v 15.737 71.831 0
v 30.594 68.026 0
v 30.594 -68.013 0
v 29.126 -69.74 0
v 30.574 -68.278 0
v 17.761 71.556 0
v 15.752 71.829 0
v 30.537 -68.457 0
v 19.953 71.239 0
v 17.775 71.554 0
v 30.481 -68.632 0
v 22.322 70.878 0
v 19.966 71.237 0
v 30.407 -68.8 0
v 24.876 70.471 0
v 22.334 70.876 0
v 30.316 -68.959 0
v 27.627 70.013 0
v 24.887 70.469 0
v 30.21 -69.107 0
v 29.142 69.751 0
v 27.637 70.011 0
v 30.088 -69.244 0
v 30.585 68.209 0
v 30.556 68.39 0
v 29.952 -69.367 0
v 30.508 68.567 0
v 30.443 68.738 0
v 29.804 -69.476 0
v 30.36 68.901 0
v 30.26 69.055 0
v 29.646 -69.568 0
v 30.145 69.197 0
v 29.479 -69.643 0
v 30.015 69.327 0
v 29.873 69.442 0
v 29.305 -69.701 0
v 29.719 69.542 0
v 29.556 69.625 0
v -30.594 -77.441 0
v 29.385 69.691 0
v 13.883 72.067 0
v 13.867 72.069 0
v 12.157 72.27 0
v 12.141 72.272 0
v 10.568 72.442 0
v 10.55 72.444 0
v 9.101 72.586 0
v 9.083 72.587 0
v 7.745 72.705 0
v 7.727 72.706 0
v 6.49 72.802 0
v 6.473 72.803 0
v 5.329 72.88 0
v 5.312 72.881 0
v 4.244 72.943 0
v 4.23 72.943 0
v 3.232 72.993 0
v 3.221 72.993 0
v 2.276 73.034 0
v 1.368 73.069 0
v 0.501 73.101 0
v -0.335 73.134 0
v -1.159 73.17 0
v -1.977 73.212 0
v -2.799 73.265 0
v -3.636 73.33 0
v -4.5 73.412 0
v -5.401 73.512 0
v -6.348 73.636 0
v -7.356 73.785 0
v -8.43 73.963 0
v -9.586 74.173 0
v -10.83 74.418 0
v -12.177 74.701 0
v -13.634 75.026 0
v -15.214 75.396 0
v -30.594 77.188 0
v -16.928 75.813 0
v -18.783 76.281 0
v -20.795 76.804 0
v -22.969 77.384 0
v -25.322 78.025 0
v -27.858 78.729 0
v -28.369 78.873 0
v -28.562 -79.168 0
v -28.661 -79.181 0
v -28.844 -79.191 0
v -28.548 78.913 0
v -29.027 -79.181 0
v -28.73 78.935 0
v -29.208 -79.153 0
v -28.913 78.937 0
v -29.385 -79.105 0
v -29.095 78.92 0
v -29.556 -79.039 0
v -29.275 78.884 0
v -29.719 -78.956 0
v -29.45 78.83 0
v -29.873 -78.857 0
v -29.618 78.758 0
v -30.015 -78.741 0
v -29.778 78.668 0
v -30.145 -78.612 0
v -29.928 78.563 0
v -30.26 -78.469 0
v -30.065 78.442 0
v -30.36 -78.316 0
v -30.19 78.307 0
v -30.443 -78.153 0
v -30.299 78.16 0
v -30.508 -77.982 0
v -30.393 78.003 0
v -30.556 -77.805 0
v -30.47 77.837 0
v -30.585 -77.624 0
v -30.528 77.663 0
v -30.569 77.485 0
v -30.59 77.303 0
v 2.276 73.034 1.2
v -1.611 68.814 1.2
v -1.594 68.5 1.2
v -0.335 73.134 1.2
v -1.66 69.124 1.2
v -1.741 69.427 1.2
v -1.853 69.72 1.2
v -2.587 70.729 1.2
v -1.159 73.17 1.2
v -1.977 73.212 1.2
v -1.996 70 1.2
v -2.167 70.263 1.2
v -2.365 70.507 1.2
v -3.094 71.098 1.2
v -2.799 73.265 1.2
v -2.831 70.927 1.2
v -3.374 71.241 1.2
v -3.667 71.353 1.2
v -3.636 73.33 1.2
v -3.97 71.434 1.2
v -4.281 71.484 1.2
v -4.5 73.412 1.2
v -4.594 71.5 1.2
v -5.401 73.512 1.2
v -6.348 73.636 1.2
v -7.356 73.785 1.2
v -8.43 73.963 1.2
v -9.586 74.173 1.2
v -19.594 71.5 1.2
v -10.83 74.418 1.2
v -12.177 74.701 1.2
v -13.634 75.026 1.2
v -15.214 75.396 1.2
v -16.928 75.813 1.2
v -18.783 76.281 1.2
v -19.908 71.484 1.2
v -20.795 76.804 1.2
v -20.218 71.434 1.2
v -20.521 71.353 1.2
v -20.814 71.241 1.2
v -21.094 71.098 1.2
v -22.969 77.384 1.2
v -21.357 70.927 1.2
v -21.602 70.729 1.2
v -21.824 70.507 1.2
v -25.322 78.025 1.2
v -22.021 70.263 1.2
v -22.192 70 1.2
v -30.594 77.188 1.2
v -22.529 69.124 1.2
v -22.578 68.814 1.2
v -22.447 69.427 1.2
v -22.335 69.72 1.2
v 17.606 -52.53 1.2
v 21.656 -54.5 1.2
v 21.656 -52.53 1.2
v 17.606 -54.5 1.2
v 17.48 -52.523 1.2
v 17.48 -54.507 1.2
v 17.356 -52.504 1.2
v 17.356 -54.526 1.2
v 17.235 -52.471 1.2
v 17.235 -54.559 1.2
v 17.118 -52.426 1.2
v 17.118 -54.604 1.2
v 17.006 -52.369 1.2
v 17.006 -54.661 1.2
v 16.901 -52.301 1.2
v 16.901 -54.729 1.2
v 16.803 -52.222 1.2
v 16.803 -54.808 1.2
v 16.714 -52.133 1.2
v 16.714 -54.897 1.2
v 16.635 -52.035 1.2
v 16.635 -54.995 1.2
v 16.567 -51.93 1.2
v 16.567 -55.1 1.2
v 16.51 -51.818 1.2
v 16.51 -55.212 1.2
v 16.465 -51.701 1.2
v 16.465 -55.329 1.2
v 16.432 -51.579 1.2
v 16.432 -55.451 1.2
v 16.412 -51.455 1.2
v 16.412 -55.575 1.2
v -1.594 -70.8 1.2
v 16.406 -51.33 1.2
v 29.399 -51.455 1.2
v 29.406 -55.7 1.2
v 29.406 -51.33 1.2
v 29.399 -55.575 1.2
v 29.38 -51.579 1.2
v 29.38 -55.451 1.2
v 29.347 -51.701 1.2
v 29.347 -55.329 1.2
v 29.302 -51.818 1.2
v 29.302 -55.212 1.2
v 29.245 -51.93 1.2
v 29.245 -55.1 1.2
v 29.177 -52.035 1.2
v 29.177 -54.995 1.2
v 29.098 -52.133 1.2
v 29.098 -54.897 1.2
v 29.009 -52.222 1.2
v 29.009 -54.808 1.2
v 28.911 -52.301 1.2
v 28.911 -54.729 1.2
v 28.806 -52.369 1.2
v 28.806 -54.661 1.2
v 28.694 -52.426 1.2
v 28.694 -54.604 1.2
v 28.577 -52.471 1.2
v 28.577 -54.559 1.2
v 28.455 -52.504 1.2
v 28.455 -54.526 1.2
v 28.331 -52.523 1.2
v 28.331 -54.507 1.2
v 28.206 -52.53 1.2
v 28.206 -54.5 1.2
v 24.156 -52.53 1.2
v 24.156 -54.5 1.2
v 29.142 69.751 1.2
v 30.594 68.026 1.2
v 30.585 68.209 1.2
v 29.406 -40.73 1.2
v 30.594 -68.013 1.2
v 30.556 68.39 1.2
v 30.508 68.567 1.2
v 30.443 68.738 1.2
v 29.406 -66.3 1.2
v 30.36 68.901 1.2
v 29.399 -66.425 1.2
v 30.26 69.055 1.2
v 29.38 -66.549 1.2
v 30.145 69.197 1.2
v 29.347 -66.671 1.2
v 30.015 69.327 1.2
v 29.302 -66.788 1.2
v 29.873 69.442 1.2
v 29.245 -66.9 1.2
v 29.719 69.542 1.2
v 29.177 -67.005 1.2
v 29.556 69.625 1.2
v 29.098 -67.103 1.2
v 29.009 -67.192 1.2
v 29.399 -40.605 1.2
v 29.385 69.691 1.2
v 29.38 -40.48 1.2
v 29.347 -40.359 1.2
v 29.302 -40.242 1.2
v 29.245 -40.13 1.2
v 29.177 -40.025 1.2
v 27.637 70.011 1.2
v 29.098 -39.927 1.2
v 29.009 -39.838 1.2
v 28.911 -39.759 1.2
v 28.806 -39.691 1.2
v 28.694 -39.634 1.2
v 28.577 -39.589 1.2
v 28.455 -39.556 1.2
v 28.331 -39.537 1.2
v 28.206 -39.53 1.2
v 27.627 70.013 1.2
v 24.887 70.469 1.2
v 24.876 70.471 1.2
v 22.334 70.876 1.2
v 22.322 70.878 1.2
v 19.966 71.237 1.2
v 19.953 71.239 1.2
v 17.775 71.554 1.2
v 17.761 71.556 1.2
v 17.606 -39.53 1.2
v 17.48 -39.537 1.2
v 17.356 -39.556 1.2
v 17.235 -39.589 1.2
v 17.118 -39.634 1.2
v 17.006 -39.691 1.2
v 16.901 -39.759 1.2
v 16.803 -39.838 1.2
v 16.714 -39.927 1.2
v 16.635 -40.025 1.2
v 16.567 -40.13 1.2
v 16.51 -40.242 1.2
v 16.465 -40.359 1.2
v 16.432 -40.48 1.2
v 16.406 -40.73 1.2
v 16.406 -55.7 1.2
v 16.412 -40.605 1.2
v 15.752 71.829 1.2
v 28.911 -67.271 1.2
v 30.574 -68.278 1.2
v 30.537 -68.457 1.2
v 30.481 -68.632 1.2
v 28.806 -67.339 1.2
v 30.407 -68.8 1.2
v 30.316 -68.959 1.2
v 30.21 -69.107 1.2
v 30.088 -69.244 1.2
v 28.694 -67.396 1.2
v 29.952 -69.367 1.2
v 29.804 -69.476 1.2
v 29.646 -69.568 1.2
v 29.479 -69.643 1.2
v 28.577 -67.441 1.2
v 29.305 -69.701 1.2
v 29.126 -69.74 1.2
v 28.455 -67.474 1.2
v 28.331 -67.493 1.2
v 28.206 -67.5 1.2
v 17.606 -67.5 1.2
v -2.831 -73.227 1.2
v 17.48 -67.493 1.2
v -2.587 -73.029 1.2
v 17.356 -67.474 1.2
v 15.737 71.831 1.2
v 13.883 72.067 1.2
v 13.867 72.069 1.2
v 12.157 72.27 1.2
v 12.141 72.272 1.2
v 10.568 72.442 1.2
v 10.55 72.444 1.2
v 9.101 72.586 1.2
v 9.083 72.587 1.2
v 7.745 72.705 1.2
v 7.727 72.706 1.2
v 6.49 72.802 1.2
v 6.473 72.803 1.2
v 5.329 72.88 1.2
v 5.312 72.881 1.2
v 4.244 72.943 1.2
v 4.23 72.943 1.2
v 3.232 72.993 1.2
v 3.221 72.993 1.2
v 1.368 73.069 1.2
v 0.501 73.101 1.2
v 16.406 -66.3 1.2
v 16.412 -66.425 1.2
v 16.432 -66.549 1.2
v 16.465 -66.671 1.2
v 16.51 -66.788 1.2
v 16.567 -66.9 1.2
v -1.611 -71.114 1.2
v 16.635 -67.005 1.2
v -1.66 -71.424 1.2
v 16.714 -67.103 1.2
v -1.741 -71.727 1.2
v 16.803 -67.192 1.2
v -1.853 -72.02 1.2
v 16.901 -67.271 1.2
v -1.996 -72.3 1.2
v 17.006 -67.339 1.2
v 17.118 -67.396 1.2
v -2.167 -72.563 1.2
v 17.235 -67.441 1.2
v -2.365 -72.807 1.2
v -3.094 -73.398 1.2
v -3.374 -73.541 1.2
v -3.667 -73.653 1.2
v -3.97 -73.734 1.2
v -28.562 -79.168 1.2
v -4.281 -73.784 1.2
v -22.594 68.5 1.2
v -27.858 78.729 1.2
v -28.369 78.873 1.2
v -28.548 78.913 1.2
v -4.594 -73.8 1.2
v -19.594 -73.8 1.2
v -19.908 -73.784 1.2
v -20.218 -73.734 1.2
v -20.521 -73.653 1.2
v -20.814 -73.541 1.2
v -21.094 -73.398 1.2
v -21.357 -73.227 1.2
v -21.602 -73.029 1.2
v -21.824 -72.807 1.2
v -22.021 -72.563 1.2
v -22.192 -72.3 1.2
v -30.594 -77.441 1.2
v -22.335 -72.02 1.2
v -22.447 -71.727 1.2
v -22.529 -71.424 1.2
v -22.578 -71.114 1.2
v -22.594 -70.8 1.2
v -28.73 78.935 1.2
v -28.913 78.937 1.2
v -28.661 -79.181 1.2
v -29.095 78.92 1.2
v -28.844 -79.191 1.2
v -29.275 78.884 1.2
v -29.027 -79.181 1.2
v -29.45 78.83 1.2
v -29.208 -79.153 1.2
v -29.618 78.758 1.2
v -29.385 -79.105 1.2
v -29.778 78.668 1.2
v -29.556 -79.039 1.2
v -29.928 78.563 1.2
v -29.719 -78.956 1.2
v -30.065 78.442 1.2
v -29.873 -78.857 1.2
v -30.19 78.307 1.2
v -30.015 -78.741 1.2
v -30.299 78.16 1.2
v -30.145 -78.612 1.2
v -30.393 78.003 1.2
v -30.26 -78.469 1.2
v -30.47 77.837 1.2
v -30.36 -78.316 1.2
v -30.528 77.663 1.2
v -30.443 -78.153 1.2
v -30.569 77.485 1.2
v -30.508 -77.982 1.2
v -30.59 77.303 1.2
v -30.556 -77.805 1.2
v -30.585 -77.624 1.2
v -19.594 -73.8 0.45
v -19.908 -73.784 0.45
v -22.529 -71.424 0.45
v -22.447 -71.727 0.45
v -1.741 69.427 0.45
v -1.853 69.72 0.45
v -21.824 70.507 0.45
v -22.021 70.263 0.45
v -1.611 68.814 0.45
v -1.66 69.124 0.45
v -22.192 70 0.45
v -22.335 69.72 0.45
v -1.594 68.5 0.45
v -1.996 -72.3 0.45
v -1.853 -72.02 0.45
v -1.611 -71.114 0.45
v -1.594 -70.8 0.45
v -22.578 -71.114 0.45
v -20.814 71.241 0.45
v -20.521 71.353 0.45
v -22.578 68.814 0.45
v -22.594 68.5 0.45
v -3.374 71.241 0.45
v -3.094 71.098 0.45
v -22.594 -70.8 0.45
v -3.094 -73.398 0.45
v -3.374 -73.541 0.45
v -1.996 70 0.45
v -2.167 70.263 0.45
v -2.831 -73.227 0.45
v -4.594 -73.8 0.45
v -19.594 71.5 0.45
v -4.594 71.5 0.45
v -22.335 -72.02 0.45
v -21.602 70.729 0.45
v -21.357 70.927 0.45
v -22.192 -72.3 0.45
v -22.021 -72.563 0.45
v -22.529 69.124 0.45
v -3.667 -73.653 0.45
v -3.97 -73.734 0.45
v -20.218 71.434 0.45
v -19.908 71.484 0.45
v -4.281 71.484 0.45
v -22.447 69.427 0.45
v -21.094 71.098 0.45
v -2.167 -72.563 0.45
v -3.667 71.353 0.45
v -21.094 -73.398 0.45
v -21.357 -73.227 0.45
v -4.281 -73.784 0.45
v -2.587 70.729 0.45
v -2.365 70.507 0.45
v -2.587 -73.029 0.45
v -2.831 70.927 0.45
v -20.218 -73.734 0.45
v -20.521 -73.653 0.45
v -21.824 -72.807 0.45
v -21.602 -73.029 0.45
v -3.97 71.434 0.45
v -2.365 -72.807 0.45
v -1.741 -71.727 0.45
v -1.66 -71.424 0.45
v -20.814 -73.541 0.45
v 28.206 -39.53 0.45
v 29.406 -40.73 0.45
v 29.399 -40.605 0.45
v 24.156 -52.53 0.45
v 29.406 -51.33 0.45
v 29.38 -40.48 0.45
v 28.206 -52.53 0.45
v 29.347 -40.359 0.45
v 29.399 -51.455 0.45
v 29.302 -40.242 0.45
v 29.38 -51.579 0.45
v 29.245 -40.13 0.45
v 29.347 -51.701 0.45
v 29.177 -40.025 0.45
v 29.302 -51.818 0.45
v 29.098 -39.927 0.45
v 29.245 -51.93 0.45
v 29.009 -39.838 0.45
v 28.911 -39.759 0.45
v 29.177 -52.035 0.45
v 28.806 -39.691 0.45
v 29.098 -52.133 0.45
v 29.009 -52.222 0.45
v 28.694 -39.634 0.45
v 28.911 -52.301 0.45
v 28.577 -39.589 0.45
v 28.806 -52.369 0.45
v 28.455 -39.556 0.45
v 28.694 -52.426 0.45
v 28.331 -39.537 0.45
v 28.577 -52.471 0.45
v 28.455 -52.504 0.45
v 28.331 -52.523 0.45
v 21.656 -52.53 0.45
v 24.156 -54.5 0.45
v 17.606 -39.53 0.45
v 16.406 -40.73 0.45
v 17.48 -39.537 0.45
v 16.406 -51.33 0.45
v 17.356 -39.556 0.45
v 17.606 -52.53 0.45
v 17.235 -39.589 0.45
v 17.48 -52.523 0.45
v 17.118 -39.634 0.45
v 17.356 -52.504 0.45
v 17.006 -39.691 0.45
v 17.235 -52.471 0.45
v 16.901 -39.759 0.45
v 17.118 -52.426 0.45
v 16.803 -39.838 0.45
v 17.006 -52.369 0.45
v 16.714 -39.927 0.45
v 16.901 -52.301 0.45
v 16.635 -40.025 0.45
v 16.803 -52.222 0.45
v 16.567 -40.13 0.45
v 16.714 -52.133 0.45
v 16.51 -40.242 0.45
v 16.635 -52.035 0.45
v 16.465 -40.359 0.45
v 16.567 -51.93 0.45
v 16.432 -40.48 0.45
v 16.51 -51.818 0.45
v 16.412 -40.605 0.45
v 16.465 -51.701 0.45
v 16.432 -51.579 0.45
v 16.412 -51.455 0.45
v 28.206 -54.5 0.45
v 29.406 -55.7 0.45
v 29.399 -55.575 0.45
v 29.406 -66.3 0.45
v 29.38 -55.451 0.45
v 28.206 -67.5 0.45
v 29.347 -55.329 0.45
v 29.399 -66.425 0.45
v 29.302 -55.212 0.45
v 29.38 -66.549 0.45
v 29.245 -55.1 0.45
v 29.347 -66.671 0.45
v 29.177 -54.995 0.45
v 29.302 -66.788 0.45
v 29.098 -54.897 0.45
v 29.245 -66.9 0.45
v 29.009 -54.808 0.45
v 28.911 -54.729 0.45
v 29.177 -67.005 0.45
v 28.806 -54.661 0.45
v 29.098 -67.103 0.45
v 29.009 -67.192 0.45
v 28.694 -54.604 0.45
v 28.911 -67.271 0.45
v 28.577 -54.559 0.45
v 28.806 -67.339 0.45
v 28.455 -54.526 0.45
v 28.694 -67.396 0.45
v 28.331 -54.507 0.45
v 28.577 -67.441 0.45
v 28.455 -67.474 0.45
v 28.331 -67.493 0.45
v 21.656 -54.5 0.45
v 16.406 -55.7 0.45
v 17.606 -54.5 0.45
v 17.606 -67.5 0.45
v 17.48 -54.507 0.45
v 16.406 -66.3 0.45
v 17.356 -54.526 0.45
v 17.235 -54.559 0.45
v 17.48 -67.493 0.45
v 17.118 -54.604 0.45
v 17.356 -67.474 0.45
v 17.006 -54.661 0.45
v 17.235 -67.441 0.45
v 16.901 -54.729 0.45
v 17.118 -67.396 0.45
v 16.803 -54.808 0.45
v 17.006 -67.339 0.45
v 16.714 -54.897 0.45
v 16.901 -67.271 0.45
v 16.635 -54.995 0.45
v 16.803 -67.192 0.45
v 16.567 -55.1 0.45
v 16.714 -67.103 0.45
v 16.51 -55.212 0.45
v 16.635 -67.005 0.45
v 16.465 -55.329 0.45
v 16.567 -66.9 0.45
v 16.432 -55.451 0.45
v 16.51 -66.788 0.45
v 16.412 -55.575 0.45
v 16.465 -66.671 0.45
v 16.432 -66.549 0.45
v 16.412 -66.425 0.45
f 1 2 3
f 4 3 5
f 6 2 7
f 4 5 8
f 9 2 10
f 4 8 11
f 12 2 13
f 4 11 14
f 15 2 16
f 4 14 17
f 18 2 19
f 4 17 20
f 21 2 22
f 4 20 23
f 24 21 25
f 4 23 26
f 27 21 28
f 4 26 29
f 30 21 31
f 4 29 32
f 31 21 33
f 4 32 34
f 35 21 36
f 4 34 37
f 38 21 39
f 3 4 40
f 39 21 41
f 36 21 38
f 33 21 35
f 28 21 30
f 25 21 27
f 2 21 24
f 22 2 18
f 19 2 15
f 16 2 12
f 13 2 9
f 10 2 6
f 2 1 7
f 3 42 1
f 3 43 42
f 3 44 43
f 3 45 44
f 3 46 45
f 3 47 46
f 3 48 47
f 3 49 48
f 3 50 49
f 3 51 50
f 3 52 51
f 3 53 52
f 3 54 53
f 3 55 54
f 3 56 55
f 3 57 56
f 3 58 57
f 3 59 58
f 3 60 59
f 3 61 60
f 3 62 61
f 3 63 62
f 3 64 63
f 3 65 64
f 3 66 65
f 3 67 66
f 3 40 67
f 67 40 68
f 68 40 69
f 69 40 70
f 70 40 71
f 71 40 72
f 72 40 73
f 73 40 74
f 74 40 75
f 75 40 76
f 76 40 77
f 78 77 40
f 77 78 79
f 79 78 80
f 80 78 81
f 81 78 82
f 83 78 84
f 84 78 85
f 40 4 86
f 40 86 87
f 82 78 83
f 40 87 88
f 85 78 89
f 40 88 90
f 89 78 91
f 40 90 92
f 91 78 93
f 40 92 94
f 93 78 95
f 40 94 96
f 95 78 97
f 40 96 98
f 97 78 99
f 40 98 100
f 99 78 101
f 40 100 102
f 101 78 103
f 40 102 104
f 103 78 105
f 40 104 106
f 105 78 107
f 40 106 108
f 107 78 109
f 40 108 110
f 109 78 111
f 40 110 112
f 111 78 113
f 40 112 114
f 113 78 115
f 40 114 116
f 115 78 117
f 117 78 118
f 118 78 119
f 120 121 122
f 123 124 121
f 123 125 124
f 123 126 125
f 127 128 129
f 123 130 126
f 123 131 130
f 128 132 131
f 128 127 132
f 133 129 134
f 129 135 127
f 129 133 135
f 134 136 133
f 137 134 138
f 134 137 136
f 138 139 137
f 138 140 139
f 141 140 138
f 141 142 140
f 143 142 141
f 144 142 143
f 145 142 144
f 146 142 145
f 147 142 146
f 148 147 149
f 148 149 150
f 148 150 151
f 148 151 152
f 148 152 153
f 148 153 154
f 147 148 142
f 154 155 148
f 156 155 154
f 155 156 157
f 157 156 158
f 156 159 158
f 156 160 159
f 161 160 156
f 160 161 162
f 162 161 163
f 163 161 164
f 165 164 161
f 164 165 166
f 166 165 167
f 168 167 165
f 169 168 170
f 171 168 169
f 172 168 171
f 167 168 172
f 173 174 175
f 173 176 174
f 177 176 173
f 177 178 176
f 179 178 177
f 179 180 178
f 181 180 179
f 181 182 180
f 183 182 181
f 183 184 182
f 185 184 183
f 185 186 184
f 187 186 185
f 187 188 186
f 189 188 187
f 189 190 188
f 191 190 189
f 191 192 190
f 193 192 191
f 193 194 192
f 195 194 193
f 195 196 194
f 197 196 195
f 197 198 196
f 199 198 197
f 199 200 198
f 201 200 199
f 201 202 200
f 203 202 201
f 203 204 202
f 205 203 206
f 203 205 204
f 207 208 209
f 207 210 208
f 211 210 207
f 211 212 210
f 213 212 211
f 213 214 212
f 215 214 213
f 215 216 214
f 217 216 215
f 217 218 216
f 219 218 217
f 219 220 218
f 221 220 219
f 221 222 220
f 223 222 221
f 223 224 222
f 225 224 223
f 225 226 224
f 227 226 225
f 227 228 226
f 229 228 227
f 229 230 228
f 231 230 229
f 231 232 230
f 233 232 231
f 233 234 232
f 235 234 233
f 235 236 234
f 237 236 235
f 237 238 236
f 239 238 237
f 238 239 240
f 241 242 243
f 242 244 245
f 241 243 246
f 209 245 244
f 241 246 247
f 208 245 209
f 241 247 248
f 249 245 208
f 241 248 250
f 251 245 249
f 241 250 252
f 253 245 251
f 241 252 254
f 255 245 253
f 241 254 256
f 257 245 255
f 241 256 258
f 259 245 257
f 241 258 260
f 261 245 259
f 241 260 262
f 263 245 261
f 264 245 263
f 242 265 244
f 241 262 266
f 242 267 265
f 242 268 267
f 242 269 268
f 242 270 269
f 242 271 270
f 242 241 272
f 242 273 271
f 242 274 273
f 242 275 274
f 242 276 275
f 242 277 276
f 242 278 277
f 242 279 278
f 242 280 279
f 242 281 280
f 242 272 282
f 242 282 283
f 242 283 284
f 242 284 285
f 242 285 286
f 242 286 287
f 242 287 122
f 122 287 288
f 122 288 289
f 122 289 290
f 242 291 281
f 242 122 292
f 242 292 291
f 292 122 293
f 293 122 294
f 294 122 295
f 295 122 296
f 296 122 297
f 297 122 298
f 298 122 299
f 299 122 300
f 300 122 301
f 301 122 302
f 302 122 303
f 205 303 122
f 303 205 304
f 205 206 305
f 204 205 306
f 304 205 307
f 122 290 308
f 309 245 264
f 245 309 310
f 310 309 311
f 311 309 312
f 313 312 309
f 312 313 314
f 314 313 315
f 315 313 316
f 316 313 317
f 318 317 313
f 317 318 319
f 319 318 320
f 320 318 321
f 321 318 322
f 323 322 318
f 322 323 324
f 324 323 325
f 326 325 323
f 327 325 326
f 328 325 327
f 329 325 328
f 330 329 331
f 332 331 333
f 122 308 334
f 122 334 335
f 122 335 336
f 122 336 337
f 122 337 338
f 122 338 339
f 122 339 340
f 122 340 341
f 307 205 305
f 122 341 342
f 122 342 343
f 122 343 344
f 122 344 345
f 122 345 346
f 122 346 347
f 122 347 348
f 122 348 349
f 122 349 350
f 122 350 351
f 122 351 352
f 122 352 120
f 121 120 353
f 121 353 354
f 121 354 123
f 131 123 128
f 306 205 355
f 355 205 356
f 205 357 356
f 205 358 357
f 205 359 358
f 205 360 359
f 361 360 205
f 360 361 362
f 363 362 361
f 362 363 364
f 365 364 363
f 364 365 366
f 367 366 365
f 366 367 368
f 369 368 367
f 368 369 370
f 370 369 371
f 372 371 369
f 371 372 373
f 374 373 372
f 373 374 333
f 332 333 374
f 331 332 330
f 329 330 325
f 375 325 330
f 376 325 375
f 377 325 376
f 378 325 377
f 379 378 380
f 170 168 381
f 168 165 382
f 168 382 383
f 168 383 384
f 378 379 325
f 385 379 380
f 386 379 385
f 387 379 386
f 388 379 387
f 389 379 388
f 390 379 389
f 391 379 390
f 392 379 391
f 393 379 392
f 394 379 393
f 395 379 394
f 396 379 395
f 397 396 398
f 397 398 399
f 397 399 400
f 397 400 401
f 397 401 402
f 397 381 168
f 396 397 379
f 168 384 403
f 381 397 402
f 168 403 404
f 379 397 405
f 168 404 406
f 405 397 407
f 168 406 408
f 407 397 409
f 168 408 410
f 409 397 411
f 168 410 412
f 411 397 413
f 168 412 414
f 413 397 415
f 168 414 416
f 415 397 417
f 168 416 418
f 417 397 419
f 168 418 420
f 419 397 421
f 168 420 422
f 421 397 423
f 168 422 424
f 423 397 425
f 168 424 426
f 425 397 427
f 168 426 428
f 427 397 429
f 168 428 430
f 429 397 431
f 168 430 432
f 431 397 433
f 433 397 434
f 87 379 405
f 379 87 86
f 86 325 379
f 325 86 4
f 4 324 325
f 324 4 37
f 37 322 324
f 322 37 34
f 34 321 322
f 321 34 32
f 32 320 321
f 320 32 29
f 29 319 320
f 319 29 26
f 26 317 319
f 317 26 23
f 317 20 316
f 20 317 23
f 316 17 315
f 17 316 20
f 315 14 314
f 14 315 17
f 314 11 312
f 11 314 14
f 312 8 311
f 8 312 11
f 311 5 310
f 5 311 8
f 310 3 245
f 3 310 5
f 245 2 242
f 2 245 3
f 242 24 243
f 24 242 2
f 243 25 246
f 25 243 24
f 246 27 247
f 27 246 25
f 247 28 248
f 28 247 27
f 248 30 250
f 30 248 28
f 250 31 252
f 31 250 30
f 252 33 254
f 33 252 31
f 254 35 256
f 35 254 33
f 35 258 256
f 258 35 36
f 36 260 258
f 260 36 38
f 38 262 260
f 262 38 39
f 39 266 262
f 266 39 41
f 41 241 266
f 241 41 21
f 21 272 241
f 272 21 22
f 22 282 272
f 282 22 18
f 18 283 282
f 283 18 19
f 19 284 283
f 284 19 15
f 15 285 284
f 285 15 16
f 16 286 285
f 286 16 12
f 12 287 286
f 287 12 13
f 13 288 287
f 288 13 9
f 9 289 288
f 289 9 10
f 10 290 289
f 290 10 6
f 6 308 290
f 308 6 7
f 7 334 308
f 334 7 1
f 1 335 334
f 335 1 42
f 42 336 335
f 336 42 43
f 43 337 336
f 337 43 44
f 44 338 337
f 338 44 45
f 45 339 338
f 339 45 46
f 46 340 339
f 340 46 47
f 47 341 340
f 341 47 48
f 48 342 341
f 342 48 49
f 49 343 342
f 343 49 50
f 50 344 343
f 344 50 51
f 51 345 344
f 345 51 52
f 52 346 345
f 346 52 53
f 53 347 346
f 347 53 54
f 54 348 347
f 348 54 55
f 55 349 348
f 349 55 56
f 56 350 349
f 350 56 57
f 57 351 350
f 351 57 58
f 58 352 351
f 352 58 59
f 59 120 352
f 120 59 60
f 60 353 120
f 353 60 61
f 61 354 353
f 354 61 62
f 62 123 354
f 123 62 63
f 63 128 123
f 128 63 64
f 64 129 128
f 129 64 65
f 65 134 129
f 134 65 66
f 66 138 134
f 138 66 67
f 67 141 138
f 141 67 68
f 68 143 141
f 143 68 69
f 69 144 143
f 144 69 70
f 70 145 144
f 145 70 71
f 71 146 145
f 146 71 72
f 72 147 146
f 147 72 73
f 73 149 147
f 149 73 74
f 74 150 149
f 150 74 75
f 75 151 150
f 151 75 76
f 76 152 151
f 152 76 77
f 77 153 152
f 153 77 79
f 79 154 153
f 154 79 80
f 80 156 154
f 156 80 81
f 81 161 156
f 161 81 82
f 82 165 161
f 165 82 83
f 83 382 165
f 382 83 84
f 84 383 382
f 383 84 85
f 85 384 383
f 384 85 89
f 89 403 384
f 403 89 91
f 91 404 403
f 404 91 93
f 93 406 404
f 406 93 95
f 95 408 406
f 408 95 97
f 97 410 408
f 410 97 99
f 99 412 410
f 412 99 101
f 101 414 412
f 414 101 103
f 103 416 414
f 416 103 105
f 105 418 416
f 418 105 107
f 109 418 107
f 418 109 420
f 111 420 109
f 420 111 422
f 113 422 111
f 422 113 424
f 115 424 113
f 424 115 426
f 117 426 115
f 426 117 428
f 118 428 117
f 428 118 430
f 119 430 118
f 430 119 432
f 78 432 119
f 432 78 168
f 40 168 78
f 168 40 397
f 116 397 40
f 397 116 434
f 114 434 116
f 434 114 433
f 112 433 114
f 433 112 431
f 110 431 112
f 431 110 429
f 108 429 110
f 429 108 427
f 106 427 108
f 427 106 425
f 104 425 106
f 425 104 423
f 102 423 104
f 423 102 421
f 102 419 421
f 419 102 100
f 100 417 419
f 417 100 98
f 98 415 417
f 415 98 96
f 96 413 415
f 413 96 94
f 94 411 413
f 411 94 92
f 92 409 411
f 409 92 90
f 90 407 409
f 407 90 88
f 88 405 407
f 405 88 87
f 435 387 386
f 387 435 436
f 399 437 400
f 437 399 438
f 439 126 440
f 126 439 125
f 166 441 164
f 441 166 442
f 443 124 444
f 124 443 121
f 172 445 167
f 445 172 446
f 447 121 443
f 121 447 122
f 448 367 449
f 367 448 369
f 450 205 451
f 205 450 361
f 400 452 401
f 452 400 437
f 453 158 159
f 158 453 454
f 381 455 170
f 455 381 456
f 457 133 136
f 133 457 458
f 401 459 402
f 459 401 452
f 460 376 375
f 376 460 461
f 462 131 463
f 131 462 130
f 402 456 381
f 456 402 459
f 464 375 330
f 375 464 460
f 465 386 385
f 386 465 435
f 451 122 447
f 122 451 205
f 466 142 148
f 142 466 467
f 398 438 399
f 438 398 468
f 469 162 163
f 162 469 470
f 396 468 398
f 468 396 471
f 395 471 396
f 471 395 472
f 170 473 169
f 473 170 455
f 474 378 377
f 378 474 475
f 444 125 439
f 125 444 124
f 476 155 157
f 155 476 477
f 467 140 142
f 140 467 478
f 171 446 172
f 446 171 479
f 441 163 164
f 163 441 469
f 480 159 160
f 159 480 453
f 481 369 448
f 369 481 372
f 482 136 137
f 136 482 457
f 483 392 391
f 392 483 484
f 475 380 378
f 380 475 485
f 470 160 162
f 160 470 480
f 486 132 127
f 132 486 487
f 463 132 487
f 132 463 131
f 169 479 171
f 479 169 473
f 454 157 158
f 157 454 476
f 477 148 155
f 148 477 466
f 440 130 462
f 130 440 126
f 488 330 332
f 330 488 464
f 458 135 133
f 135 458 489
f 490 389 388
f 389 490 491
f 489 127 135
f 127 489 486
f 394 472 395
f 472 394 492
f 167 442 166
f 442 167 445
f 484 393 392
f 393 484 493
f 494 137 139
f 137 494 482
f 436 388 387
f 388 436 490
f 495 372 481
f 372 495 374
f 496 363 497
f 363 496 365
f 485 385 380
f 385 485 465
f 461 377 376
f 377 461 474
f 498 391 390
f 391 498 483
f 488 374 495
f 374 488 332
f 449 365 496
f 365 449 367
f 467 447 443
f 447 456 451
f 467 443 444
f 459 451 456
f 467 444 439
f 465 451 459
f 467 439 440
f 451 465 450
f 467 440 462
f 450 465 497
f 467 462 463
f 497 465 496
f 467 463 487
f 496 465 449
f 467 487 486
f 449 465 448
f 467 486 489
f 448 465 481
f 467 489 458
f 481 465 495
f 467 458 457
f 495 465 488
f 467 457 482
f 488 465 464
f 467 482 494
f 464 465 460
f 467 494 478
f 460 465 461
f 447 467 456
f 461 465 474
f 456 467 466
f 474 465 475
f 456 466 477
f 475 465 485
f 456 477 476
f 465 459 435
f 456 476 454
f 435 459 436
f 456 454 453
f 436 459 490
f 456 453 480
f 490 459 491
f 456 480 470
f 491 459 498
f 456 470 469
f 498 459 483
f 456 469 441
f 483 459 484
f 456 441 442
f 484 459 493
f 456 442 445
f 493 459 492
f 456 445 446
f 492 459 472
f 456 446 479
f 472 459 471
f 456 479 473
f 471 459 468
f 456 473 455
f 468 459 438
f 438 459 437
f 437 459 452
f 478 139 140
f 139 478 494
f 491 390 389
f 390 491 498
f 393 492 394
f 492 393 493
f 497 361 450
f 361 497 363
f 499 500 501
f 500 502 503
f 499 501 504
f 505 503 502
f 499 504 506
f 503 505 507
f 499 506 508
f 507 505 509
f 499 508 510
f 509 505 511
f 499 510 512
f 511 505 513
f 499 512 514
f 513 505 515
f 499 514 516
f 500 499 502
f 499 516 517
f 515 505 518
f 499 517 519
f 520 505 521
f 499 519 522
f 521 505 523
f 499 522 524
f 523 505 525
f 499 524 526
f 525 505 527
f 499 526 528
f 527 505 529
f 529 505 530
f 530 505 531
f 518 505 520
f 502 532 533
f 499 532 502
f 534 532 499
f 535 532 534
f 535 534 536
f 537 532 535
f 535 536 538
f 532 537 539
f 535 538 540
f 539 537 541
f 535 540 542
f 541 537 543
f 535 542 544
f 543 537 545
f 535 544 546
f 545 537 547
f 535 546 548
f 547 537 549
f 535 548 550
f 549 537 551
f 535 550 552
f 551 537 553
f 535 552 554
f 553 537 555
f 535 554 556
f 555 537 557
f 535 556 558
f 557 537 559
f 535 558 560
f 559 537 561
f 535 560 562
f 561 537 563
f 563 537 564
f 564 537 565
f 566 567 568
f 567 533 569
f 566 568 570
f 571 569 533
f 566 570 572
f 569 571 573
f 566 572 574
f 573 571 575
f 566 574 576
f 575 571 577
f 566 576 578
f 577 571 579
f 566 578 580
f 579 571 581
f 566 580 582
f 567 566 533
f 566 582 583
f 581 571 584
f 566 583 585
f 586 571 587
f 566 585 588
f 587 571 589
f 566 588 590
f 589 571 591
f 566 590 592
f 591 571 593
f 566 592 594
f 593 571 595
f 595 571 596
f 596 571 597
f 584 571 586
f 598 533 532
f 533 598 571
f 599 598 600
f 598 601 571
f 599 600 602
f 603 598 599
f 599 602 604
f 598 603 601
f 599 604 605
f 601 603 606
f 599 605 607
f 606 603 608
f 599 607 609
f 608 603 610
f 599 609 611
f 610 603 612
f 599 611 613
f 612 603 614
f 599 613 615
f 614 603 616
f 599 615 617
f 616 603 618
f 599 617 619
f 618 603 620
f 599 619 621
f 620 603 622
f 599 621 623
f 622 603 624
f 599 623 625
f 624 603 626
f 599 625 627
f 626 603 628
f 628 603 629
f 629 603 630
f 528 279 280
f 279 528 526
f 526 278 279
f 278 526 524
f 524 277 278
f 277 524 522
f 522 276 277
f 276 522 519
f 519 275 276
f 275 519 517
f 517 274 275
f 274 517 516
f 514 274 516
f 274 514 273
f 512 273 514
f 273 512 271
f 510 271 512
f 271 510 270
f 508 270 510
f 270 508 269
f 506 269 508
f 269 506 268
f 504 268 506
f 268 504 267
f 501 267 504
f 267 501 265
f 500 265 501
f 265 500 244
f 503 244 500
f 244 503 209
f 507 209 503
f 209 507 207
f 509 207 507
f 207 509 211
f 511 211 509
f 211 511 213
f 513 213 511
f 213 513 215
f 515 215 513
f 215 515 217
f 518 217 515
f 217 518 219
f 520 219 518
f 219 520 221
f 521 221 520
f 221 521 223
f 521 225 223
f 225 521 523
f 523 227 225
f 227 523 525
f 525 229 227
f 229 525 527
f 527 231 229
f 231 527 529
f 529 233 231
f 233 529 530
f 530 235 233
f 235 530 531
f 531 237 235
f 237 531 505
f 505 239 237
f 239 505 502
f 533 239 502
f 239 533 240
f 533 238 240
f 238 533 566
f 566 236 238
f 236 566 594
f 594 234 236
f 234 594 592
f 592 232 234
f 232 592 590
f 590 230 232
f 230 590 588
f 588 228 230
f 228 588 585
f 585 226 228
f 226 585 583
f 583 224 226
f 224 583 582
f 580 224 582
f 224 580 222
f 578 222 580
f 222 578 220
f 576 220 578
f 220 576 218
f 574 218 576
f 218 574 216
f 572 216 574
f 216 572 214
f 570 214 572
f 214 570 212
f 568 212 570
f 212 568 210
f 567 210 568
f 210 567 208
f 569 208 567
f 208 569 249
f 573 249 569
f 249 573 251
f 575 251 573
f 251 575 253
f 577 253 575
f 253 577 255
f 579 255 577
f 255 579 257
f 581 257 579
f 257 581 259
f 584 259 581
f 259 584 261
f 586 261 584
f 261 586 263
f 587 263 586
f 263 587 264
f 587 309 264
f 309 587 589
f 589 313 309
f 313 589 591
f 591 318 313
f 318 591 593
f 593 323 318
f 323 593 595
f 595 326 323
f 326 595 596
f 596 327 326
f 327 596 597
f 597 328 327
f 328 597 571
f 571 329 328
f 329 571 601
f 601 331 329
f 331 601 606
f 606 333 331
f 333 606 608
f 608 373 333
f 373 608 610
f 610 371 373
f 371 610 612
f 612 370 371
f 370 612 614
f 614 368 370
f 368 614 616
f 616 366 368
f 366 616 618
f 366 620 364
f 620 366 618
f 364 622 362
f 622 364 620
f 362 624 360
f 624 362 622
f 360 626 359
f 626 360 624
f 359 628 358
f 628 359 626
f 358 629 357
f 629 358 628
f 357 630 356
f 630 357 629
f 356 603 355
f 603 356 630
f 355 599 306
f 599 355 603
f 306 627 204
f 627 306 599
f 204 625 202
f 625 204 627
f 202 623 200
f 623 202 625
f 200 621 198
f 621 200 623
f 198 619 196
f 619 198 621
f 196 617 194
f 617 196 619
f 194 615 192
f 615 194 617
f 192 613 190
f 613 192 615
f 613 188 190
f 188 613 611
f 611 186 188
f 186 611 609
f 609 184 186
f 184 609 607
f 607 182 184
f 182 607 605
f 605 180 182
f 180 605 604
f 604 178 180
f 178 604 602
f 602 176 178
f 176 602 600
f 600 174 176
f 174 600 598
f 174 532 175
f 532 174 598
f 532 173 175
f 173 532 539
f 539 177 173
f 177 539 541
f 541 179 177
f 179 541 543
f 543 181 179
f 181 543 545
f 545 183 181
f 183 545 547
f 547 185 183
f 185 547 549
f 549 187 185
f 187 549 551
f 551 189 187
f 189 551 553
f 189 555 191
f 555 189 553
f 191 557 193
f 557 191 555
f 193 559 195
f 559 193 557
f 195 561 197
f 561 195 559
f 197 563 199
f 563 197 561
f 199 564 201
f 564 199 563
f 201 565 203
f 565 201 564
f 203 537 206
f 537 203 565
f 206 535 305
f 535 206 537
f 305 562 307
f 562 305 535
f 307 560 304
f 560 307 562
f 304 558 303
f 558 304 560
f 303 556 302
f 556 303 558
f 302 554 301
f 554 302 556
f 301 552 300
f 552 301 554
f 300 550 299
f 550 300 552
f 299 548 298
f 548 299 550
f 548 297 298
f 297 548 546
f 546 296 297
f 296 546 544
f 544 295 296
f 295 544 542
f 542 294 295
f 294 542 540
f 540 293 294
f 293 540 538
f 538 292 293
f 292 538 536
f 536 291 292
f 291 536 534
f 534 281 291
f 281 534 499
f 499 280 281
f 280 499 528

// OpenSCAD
// ============================================================
// Omnichord OM-27 Strumplate Top Plate
// ============================================================
// A cover plate that sits over the flex PCB strum strip.
// Two features create the gap needed between the flex PCB
// contacts and the conductive strumming surface:
//
//   1. MAIN VALLEY  -> a shallow recess: a slim rectangle with small
//      rounded corners at the short ends (NOT a fat pill/stadium),
//      running nearly the FULL length of the plate, independent of
//      where the pad cluster sits, cut to recess_depth.
//   2. PAD RECESS   -> a shallow pocket (same recess_depth) over the
//      small contact pad near the top, connected to a second
//      smaller pocket by a thin bridge slot (matches the two
//      cutouts + connecting tab seen in the reference CAD model).
//
// Both recesses are cut from the TOP face only, leaving a thin,
// paper-thin BOTTOM skin (bottom_skin_thickness) untouched -- that
// skin is the side the user's finger touches, and should be printed
// face-down on the bed as the first layer for max smoothness.
//
// Adjust the PARAMETERS block below to match your real
// measurements -- nothing else needs to change.
// ============================================================

/* [Overall plate -- asymmetric trapezoid with an S-curved top edge] */
// The two LONG edges (left & right) are PARALLEL to each other and are
// the sides the long valley recess runs alongside. The two SHORT edges
// (top & bottom) connect them and are NOT parallel to each other.
// The TOP short edge (opposite the pad cluster, which is mirrored to
// sit near the bottom in the 3D assembly below) is not straight -- it's
// a smooth S-curve built from a cubic Bezier with two INDEPENDENTLY
// tunable control points, so the two lobes (peaks/valleys) of the S no
// longer have to mirror each other.
edge_left_long   = 159;  // length of the long left edge, mm
edge_right_long  = 139;  // length of the long right edge, mm
edge_top_short   = 62;   // length of the short top edge, mm (straight-line/chord distance
                          // between TL and TR -- the S-curve deviates from this)
edge_bottom_short = 62;  // length of the short bottom edge, mm (straight)
corner_radius     = 1.75; // small rounding at all four corners (just enough to not be knife-sharp)

// --- S-curve control points (independent left/right lobes) ---
// The curve is a cubic Bezier from TL to TR:
//   P0 = TL
//   P1 = TL + t1*chord + outward_dir * ctrl1_offset   (controls the LEFT lobe)
//   P2 = TL + t2*chord + outward_dir * ctrl2_offset   (controls the RIGHT lobe)
//   P3 = TR
// where "outward_dir" points away from the plate body (so a POSITIVE
// offset bulges OUT, a NEGATIVE offset dips IN).
//
// IMPORTANT -- these are CONTROL POINT offsets, not the final realized
// peak deviation of the curve. A cubic Bezier always pulls the curve back
// toward its endpoints, so the actual peak bulge/dip you see will be
// noticeably SMALLER than these numbers (very roughly 30-45% of the
// control offset for typical t1/t2 values below, but the two lobes
// interact with each other, so there's no single exact conversion
// factor when they're independent -- nudge the numbers and re-render
// to dial in the look, rather than solving for an exact target).
scurve_t1          = 0.63;  // 0-1, position of the LEFT control point along the chord
scurve_ctrl1_offset = -4.5;    // mm, LEFT lobe control offset (+ = bulges out, - = dips in)
scurve_t2          = 0.33;  // 0-1, position of the RIGHT control point along the chord
scurve_ctrl2_offset = 0.5;  // mm, RIGHT lobe control offset (+ = bulges out, - = dips in)
scurve_resolution   = 40;   // number of segments used to sample the curve (higher = smoother)

// --- Derived corner geometry (do not edit) ---
// Solve for the perpendicular distance `plate_w` between the two parallel
// long edges, and the vertical stagger `edge_offset` of the right edge
// relative to the left edge, such that the connecting short edges come
// out to edge_top_short / edge_bottom_short exactly (using the straight-
// line/chord length for the top edge, since the S-curve is added after).
// System (derived once and baked in as a closed-form solution):
//   bottom_short^2 = plate_w^2 + edge_offset^2
//   top_short^2    = plate_w^2 + (edge_left_long - (edge_offset + edge_right_long))^2
// Subtracting and solving for edge_offset:
_k = edge_left_long - edge_right_long;
edge_offset = ( (edge_bottom_short*edge_bottom_short) - (edge_top_short*edge_top_short) + (_k*_k) ) / (2*_k);
plate_w = sqrt(edge_bottom_short*edge_bottom_short - edge_offset*edge_offset);

// Corner coordinates (left edge along x=0, right edge along x=plate_w),
// then re-centered so x=0 sits on the long-axis centerline and y=0 sits
// at the vertical midpoint of the left edge, for convenient downstream use.
_BL = [0, 0];
_TL = [0, edge_left_long];
_BR = [plate_w, edge_offset];
_TR = [plate_w, edge_offset + edge_right_long];
_cx = plate_w/2;
_cy = edge_left_long/2;
BL = _BL - [_cx, _cy];
TL = _TL - [_cx, _cy];
BR = _BR - [_cx, _cy];
TR = _TR - [_cx, _cy];

// plate_length kept for backward compatibility with valley/pad placement
// below -- approximate overall span used for "distance from top" offsets.
plate_length = max(TL.y, TR.y) - min(BL.y, BR.y);

// The plate is built from two thicknesses stacked:
//   bottom_skin_thickness -> the touch surface (prints FIRST, face-down on the bed).
//                            Keep this paper-thin (1-2 perimeter layers, e.g. 0.2-0.4mm
//                            at a 0.2mm layer height) so finger contact can reach through
//                            wherever the recess above it is cut.
//   recess_depth           -> how deep the valley/pad recesses cut into the TOP face.
// plate_thickness is just their sum -- change the two thickness values, not this one.
bottom_skin_thickness = 0.45;   // <-- paper-thin touch surface, tune to your layer height
recess_depth          = 0.75;   // depth of the valley + pad recesses, cut from the top
plate_thickness        = bottom_skin_thickness + recess_depth;

/* [Main valley - shallow recess, sized to the OM-84 flex PCB contact row] */
// Measured from the OM-84 strumplate_traces.svg: 13 contacts, pitch
// 11.275mm center-to-center, each contact finger 13.698mm long (the
// across-strip dimension) x 4.421mm wide (the along-strip dimension).
contact_pitch       = 11.275; // mm, center-to-center spacing along the strip
contact_count       = 13;     // number of contacts in the row
valley_width      = 21;   // matches the OM-84 contact finger length (across-strip)
valley_length     = contact_pitch * (contact_count - 1) + 10; // total span of the row, ~139.7mm
valley_margin_top    = 8;  // gap kept between the top-left corner and the start of the valley
                             // (only used to help VERTICALLY CENTER the now fixed-length valley;
                             // see valley_2d() below)
valley_inset      = valley_width/2+8;    // how far in from the LEFT edge the recess sits, mm
valley_end_radius = 3;    // corner rounding radius at the two short ends (small radius,
                           // NOT half the width -- gives slim rounded-rect ends like the
                           // metallic strip in the reference photo, not a full pill cap)

/* [Pad recess cluster - sized to the OM-84 flex PCB pad contacts] */
// Measured from the same SVG: pad pitch 14.97mm center-to-center.
pad_contact_pitch = 14.97;  // mm, center-to-center spacing between the two pads
pad1_w = 13; pad1_h = 13;   // upper pad rectangle (rounded)
pad2_w = 13; pad2_h = 13;   // lower pad rectangle (rounded)
pad_corner_r       = 1.2;   // corner rounding for the pad rectangles
pad_gap            = pad_contact_pitch - pad1_h/2 - pad2_h/2; // vertical gap between pad1/pad2, derived from pitch
tab_width          = 2.5;   // width of the connecting bridge slot between pad1/pad2
min_wall_to_valley = 4;     // (unused now that spacing is set directly by distance below;
                             // kept only for reference/back-compat)
pad_to_valley_center_dist = 35; // distance between pad-cluster center and valley center, mm

// Final layout: the VALLEY sits on the NEGATIVE X side (toward the
// left edge) and stays exactly where it was. The PAD CLUSTER's center
// is placed exactly pad_to_valley_center_dist (35mm) away from the
// valley's center, along X.
pad_cluster_half_w = max(pad1_w, pad2_w) / 2;
valley_x_center = BL.x + valley_inset;
pad_offset_x = valley_x_center + pad_to_valley_center_dist;
pad_offset_y_top = TL.y - 25 + 13;   // y position where pad1 (upper) starts, measured down from top-left corner

/* [Rendering] */
$fn = 60;

// ============================================================
// 2D PROFILES
// ============================================================

// Asymmetric trapezoid plate outline: long left edge and long right
// edge are parallel; short bottom edge is straight; short TOP edge is
// a cubic-Bezier S-curve with two independently tunable control points
// (see scurve_* parameters above), built from the solved corner points
// BL/TL/BR/TR, with small corner rounding applied at the end.
function _bezier(t, P0,P1,P2,P3) =
    pow(1-t,3)*P0 + 3*pow(1-t,2)*t*P1 + 3*(1-t)*pow(t,2)*P2 + pow(t,3)*P3;

module plate_solid_2d() {
    chord = TR - TL;
    chord_len = norm(chord);
    u = chord / chord_len;
    perp = [u.y, -u.x];
    plate_center_dir = ((BL + BR) / 2) - (TL + TR) / 2;
    // outward_dir points AWAY from the plate body (so + offsets bulge out)
    outward_dir = (perp.x*plate_center_dir.x + perp.y*plate_center_dir.y > 0) ? -perp : perp;

    P0 = TL;
    P1 = TL + scurve_t1*chord + outward_dir*scurve_ctrl1_offset;
    P2 = TL + scurve_t2*chord + outward_dir*scurve_ctrl2_offset;
    P3 = TR;

    N = scurve_resolution;
    // sampled TL -> TR; reversed below for correct polygon winding
    top_curve_TL_to_TR = [
        for (i = [0:N])
            _bezier(i/N, P0, P1, P2, P3)
    ];
    top_curve_pts = [for (i = [N:-1:0]) top_curve_TL_to_TR[i]]; // TR -> ... -> TL

    offset(r = corner_radius)
        offset(delta = -corner_radius)
            polygon(points = concat([BL, BR], top_curve_pts));
}

// Single rounded rectangle helper (centered)
module rounded_rect(w, h, r) {
    hull() {
        translate([ w/2 - r,  h/2 - r]) circle(r = r);
        translate([-w/2 + r,  h/2 - r]) circle(r = r);
        translate([ w/2 - r, -h/2 + r]) circle(r = r);
        translate([-w/2 + r, -h/2 + r]) circle(r = r);
    }
}

// Main valley: long slim rectangle with small rounded corners at the
// short ends, sized to exactly span the OM-84 contact row (fixed
// valley_length, see PARAMETERS), inset in from the left edge.
module valley_2d() {
    y_top = TL.y - valley_margin_top;
    y_center = y_top - valley_length/2;

    translate([valley_x_center, y_center])
        rounded_rect(valley_width, valley_length, valley_end_radius);
}

// Pad recess cluster: pad1 (upper) + pad2 (lower) + connecting bridge tab
module pad_cluster_2d() {
    pad1_cy = pad_offset_y_top - pad1_h/2;
    pad2_cy = pad1_cy - pad1_h/2 - pad_gap - pad2_h/2;

    union() {
        translate([pad_offset_x, pad1_cy])
            rounded_rect(pad1_w, pad1_h, pad_corner_r);

        translate([pad_offset_x, pad2_cy])
            rounded_rect(pad2_w, pad2_h, pad_corner_r);

        // connecting bridge between the two pads
        translate([pad_offset_x, (pad1_cy + pad2_cy)/2])
            square([tab_width, pad1_h/2 + pad_gap + pad2_h/2], center = true);
    }
}

// ============================================================
// 3D ASSEMBLY
// ============================================================
// Orientation: z=0 is the BOTTOM touch surface (this should be
// the face that sits on the print bed, i.e. print this part
// face-down / recesses-up so the smooth first layer becomes the
// finger-touch side). z = plate_thickness is the TOP face where
// both recesses are cut in.

module strumplate() {
    difference() {
        // base plate
        linear_extrude(height = plate_thickness)
            plate_solid_2d();

        // 1) main valley -- shallow recess cut from the TOP face only,
        //    leaving bottom_skin_thickness of solid material below it
        translate([0, 0, bottom_skin_thickness])
            linear_extrude(height = recess_depth + 0.5)
                valley_2d();

        // 2) pad recess -- shallow pocket cut from the TOP face only,
        //    same depth, same remaining bottom skin
        translate([0, 0, bottom_skin_thickness])
        mirror([0,1,0])
            linear_extrude(height = recess_depth + 0.5)
                pad_cluster_2d();
    }
}

strumplate();

// ------------------------------------------------------------
// Uncomment to sanity-check the 2D layout from directly above
// before committing to the 3D print:
// projection(cut = false) strumplate();
